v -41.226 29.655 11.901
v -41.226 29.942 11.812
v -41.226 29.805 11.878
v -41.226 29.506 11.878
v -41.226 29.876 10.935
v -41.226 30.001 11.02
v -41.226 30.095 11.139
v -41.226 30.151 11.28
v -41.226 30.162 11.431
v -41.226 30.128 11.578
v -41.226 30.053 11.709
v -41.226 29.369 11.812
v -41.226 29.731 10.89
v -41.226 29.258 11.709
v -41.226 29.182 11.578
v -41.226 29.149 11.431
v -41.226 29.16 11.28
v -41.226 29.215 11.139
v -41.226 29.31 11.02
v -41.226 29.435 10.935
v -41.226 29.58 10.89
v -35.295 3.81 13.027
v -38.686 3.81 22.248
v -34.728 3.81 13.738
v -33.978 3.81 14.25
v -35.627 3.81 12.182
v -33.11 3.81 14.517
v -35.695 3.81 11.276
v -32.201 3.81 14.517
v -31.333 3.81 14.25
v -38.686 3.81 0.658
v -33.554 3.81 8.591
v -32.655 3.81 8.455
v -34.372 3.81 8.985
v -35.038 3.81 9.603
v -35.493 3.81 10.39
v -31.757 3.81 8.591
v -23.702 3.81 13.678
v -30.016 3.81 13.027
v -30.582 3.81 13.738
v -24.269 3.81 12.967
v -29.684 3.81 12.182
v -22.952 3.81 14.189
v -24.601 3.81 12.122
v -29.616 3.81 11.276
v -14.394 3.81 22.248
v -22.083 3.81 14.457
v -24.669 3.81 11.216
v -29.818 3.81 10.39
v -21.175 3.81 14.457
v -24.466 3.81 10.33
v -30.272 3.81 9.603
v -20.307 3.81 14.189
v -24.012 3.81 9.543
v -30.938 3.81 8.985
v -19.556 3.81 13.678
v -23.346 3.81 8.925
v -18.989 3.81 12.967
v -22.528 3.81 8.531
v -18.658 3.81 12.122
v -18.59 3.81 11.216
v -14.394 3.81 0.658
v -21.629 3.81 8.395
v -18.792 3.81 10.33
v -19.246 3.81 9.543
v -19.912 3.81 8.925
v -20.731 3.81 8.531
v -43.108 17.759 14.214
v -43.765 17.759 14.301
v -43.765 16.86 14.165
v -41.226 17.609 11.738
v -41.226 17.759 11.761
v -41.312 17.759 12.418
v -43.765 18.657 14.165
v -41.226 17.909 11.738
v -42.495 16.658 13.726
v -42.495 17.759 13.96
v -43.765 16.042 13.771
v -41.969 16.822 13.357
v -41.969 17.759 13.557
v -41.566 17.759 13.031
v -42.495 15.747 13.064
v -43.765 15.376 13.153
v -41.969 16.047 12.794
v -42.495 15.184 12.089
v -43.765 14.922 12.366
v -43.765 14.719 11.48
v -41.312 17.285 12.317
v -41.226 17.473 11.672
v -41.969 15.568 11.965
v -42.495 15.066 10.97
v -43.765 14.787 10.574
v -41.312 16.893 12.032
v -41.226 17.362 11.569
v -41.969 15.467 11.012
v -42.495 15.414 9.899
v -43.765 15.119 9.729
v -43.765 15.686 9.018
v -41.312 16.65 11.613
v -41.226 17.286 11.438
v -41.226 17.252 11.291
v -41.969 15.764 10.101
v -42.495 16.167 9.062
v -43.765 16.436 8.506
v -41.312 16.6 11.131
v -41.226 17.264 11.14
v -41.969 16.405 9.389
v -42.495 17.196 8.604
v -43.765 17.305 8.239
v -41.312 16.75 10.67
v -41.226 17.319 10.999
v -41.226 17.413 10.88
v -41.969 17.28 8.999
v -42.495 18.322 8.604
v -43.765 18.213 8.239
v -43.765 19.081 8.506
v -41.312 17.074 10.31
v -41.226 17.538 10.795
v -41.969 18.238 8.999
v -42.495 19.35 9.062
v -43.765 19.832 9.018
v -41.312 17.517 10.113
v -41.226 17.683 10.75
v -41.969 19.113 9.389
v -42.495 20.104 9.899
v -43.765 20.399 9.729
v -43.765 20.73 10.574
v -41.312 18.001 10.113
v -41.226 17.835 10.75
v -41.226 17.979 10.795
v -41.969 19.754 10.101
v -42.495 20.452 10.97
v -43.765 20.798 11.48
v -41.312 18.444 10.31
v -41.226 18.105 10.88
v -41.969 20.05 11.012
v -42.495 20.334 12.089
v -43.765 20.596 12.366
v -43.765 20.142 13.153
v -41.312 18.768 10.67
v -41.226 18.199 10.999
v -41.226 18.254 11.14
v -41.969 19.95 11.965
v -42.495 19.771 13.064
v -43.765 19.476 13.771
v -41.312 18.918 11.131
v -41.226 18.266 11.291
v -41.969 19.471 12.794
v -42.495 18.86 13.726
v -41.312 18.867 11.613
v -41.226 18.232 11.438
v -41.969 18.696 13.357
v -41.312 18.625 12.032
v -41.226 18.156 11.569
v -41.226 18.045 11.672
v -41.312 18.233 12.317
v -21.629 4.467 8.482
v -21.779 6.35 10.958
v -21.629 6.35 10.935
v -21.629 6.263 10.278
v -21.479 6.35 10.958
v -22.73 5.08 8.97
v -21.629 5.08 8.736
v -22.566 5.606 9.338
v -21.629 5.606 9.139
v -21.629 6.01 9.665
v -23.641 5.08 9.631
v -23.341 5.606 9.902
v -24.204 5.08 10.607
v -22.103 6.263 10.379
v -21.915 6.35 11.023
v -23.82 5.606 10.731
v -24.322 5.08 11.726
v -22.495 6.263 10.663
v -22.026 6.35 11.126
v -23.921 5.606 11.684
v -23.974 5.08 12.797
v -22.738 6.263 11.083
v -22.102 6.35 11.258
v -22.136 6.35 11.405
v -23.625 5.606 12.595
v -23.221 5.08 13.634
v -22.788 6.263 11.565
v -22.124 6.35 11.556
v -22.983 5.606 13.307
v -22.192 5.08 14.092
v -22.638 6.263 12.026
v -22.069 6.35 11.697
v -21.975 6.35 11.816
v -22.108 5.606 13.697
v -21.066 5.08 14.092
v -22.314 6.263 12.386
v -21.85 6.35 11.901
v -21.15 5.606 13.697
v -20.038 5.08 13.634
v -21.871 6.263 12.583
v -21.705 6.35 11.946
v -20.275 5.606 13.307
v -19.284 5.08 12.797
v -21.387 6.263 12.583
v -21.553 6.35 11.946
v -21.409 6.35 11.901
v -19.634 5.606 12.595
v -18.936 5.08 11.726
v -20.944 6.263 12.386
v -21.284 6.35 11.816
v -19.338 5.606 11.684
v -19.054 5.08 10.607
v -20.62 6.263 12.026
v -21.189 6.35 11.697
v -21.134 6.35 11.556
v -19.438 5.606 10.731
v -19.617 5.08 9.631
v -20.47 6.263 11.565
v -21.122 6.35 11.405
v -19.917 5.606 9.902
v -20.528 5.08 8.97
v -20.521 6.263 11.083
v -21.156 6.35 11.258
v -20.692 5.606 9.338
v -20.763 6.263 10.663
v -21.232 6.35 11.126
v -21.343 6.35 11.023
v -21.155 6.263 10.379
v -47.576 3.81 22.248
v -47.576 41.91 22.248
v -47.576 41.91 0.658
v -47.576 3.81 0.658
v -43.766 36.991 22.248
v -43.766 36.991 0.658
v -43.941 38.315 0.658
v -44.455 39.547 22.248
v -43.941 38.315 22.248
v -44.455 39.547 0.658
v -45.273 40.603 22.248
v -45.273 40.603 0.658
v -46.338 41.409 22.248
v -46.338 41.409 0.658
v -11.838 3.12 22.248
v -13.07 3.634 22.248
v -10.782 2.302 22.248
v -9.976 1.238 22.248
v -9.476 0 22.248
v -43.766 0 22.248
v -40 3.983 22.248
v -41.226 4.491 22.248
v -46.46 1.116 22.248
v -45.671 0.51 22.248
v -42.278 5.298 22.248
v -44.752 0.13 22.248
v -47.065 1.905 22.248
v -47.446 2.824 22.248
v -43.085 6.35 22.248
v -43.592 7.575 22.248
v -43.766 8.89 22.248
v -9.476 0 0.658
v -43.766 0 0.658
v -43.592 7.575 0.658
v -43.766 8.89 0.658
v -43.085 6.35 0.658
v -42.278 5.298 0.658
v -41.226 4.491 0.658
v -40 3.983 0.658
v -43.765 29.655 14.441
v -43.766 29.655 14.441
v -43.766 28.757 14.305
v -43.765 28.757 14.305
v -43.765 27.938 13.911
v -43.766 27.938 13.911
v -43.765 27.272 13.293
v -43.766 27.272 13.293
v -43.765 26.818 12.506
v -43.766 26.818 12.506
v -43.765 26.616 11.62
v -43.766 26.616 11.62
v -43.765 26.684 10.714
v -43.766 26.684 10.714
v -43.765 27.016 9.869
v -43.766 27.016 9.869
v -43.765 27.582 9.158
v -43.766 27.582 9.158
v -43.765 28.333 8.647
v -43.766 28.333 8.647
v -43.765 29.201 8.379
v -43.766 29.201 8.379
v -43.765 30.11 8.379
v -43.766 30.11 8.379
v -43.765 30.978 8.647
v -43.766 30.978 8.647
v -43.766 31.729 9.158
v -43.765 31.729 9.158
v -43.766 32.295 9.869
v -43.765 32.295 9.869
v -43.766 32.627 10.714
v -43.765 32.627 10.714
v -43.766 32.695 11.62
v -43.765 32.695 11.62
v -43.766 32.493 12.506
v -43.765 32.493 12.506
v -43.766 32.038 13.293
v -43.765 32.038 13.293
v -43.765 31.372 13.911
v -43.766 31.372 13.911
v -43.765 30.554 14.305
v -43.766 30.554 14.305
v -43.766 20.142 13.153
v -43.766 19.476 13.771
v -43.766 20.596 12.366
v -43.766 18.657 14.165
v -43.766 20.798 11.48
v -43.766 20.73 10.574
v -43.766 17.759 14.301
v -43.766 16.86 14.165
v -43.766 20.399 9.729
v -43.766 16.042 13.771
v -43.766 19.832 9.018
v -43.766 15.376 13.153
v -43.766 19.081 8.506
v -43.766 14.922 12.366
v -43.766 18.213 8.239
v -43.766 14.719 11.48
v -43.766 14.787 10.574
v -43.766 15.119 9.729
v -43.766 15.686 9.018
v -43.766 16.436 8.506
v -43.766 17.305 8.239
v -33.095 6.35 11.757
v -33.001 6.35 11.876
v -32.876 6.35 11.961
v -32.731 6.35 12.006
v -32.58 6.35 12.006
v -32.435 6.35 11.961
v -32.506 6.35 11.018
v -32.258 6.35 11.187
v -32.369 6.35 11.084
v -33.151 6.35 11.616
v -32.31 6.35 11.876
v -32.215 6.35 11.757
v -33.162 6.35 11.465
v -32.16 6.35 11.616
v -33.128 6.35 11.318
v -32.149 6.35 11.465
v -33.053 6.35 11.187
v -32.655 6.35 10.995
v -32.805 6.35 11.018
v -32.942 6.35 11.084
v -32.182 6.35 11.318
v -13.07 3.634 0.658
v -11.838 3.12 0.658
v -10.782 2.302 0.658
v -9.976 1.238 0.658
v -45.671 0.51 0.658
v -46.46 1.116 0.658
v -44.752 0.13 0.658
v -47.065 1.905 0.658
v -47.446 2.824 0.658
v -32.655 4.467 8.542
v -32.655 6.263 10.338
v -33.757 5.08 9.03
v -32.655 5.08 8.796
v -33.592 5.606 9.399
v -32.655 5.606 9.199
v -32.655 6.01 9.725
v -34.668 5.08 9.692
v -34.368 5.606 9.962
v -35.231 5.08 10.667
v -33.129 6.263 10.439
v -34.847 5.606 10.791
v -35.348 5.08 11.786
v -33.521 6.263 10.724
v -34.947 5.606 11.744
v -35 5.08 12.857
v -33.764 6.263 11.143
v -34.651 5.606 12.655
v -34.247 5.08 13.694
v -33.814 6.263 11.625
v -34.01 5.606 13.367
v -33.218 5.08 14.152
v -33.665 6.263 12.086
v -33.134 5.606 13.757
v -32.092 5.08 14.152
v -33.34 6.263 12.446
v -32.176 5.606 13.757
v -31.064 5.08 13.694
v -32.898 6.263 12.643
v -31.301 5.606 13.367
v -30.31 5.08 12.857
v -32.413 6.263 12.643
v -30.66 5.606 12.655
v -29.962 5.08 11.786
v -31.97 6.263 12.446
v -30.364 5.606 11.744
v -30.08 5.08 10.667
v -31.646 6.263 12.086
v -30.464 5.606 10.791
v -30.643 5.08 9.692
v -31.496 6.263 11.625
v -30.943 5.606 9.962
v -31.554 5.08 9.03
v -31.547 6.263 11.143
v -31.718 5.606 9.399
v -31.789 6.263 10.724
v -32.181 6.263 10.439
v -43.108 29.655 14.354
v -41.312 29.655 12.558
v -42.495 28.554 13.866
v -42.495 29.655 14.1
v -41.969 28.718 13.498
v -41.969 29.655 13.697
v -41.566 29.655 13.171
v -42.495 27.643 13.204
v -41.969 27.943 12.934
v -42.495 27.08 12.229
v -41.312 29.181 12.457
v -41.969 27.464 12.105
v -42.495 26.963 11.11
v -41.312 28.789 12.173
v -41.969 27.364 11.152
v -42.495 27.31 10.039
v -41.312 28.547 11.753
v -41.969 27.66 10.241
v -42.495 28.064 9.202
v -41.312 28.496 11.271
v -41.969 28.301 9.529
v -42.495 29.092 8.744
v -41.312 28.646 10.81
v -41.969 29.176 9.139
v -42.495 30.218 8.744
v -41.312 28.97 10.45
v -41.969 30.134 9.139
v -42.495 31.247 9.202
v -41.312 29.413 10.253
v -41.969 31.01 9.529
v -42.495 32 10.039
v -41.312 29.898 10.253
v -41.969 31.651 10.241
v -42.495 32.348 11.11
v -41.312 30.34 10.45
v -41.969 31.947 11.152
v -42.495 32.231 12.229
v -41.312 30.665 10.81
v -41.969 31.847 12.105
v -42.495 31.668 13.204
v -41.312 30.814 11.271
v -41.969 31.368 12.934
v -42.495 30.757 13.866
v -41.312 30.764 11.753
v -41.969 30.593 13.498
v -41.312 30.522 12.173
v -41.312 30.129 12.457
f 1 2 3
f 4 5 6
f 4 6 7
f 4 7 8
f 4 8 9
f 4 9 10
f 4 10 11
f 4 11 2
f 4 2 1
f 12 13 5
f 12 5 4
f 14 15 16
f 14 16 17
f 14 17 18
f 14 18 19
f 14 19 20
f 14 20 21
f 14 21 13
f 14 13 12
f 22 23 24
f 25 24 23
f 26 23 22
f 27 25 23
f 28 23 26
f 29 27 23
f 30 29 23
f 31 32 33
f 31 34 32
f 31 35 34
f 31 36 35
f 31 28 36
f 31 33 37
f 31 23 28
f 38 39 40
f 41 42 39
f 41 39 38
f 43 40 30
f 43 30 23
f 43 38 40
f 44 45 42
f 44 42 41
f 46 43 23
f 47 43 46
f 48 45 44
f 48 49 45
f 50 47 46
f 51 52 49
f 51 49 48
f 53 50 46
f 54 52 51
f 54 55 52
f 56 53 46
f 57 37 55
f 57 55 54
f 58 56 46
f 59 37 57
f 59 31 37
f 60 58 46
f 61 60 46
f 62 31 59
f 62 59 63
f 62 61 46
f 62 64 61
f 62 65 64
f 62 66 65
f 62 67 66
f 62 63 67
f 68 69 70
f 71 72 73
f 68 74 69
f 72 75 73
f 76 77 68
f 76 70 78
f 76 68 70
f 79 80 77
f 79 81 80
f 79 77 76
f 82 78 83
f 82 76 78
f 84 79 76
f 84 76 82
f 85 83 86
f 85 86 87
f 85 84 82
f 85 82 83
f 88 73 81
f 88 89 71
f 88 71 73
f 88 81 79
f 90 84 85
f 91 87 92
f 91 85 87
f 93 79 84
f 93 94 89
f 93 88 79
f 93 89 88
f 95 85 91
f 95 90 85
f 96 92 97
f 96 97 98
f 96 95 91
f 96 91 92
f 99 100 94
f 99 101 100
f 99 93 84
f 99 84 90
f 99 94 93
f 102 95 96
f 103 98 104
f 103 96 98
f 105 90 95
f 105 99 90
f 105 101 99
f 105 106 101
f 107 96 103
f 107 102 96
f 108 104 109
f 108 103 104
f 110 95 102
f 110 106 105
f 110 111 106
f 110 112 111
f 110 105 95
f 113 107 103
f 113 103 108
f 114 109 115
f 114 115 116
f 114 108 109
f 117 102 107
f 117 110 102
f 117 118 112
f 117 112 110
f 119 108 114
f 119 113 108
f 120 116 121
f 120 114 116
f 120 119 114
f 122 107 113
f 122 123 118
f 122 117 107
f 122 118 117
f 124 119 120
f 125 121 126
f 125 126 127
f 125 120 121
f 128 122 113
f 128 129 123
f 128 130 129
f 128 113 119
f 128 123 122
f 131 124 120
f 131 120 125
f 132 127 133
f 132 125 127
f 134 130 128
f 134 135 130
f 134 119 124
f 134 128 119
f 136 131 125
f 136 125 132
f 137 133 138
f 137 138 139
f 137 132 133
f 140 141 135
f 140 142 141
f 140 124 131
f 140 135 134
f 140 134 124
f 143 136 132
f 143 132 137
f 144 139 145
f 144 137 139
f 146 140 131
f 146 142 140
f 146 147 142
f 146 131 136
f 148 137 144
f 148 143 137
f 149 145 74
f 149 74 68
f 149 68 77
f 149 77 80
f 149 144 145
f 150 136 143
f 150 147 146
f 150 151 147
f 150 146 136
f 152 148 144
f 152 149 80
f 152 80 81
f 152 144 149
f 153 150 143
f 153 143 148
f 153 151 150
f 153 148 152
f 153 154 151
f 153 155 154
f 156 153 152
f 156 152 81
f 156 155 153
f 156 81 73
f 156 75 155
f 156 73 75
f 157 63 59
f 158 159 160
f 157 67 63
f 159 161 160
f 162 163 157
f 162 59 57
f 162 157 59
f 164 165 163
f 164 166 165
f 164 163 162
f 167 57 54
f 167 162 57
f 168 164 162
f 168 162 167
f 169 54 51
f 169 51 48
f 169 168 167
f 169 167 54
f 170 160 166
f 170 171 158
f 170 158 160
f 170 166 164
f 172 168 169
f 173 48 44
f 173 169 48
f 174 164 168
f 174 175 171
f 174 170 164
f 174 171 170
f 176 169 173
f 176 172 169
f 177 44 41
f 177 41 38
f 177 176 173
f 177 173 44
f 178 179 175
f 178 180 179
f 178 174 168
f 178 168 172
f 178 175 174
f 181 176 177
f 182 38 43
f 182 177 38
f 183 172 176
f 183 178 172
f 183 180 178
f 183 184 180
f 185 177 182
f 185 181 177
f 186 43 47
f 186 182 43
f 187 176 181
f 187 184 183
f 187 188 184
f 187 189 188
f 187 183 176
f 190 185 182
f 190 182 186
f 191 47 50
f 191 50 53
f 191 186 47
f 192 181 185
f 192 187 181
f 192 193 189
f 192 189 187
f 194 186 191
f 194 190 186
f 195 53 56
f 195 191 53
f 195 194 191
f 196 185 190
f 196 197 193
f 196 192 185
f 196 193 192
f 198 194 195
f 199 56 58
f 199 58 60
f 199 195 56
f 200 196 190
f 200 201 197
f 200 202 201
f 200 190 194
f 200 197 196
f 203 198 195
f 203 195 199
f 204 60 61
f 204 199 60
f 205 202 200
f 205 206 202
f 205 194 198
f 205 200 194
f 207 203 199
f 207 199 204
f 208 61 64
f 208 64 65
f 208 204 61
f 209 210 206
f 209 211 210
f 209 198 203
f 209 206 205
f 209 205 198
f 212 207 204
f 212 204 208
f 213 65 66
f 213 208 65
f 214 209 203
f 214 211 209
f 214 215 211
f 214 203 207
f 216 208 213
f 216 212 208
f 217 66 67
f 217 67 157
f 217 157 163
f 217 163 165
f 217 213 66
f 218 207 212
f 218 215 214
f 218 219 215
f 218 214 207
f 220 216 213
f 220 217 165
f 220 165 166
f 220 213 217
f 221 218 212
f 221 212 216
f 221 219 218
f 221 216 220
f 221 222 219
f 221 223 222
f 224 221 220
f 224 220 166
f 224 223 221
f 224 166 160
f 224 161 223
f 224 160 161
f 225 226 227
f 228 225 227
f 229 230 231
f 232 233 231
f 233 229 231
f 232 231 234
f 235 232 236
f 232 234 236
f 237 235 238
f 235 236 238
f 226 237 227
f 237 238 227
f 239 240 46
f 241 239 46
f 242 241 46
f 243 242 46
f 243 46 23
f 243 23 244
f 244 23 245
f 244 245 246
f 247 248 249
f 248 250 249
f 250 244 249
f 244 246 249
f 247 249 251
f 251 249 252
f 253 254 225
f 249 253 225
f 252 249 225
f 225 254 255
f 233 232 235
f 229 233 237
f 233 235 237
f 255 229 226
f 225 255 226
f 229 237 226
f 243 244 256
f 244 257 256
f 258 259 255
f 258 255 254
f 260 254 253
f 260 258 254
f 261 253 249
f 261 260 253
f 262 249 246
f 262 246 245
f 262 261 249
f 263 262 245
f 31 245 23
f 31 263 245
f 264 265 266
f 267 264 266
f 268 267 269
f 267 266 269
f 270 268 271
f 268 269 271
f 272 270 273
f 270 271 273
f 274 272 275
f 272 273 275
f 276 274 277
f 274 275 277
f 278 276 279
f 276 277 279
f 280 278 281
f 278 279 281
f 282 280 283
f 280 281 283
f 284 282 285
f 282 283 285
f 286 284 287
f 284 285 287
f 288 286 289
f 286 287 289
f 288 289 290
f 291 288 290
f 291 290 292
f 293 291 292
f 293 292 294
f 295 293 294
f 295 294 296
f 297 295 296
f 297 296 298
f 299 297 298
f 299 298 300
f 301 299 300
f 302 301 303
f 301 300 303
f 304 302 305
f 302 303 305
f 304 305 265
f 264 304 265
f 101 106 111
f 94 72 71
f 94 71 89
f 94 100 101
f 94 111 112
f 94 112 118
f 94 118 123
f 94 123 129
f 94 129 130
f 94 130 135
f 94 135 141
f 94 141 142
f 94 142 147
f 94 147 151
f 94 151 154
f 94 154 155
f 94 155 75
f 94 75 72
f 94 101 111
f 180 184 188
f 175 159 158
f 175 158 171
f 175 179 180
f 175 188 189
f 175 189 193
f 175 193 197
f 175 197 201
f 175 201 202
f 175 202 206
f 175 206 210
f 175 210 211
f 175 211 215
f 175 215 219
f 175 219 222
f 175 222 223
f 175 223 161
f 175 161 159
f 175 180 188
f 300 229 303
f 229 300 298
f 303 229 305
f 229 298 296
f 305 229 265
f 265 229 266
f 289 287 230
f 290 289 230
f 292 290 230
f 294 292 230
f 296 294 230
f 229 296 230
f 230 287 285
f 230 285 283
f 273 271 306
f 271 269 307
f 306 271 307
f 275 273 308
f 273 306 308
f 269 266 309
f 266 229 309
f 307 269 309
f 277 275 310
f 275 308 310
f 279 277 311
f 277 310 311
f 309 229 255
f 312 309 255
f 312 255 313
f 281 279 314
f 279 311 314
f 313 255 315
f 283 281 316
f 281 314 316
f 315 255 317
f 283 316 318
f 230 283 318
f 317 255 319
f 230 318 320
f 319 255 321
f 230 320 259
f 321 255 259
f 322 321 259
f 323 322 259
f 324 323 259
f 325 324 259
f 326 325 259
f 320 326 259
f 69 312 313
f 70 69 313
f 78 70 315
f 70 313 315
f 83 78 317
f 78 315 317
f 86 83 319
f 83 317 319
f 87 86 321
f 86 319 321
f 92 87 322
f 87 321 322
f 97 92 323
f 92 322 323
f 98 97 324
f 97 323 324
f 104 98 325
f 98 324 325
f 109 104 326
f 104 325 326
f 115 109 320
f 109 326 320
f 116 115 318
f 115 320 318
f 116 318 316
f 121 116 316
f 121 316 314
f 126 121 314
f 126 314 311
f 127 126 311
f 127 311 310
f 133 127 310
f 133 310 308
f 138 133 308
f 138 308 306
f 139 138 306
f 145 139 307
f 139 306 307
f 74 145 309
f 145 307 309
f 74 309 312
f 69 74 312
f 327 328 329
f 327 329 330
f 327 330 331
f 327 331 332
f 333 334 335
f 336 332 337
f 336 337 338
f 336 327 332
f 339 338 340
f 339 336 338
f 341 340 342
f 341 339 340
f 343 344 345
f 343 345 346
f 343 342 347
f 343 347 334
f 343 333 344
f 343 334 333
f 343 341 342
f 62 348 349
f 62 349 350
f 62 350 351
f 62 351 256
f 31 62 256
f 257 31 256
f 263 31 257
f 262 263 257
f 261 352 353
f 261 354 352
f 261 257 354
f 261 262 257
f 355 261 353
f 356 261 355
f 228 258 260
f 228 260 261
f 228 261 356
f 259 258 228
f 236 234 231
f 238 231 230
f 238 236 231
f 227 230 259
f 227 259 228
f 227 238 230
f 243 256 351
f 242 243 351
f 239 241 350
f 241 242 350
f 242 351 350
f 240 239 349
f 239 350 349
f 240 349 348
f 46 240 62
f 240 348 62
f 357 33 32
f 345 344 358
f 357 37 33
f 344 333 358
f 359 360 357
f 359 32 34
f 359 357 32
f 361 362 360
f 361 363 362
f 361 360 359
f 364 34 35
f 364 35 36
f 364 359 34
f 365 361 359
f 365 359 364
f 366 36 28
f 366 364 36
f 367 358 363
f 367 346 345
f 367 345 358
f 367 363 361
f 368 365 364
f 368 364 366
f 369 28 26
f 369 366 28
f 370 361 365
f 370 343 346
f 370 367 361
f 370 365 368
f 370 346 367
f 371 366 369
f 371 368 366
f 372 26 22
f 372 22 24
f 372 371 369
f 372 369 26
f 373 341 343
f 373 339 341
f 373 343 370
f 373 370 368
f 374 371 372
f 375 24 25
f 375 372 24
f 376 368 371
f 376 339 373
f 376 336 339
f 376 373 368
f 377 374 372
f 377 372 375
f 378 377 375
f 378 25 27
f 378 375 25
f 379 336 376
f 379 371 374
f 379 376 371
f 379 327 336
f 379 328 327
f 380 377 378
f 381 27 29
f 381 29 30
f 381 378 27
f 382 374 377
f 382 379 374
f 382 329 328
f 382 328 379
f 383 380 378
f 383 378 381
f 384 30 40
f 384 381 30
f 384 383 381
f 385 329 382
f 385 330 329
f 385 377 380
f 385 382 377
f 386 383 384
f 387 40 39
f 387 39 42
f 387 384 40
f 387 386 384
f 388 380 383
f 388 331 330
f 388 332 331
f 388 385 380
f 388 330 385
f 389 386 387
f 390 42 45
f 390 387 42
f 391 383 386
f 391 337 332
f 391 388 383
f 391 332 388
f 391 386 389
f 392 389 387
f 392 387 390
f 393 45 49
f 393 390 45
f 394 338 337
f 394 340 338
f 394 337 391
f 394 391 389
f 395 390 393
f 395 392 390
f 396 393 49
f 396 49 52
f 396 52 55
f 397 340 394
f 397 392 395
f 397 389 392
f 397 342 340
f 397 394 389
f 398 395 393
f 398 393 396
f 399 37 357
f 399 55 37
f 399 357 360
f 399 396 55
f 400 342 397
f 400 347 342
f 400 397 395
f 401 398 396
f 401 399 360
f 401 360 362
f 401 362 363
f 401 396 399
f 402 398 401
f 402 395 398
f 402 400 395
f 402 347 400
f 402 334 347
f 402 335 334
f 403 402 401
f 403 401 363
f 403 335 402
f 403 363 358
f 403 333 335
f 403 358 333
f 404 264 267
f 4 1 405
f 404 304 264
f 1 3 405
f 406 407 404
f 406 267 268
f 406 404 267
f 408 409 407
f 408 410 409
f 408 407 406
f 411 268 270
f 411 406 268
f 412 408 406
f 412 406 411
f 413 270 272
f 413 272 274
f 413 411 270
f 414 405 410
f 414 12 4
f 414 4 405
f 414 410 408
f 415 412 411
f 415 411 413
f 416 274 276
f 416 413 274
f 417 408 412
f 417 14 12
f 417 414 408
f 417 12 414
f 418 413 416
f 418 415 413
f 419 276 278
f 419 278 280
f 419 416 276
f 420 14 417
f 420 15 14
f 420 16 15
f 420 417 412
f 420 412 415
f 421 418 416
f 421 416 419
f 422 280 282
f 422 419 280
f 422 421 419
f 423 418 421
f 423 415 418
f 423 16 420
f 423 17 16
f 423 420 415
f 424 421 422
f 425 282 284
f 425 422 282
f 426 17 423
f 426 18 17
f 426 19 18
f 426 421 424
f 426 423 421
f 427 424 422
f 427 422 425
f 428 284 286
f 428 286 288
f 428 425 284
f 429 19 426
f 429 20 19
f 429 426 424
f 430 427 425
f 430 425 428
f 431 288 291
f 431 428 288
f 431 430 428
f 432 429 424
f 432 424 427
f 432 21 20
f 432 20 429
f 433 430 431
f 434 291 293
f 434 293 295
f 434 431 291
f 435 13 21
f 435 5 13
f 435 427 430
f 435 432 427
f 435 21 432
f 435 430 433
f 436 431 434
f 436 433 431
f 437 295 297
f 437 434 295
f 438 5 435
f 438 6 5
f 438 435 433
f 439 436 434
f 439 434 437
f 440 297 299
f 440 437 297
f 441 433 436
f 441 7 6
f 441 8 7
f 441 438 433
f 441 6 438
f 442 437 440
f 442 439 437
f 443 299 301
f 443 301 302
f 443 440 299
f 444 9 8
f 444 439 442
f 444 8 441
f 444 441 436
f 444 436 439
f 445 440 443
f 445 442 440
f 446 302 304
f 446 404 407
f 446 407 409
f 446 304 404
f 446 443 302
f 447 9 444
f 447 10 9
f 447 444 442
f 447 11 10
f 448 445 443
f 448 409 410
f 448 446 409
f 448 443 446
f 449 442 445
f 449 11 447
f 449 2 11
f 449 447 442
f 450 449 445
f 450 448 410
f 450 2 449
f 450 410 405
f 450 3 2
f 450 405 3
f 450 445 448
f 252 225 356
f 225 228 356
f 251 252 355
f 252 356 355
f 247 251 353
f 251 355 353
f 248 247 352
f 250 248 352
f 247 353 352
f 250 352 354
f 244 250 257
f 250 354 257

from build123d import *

# Parameters (mm, degrees)
SKETCH1_W           = 38.1
SKETCH1_H           = 21.59
BOSS_EXTRUDE1_DEPTH = 3.81
SKETCH2_W           = 3.81
SKETCH2_H           = 21.59
BOSS_EXTRUDE2_DEPTH = 38.1
FILLET1_R           = 5.08
FILLET2_R           = 3.81
SKETCH4_R           = 3.048
BOSS_EXTRUDE3_DEPTH = 2.54
SKETCH5_R           = 3.048
BOSS_EXTRUDE4_DEPTH = 2.54
FILLET3_R           = 2.54


# Some blends are built 0.0001 mm under size
with BuildPart() as part:
    # Sketch1 → Boss-Extrude1 (new body)
    with BuildSketch(Plane(origin=(0, 0, 0), x_dir=(1, 0, 0), z_dir=(0, 1, 0))):
        with Locations((-28.525509612, -11.453306042)):
            Rectangle(SKETCH1_W, SKETCH1_H)
    extrude(amount=BOSS_EXTRUDE1_DEPTH)

    # Sketch2 → Boss-Extrude2 (add)
    with BuildSketch(Plane(origin=(0, 3.81, 0), x_dir=(1, 0, 0), z_dir=(0, 1, 0))):
        with Locations((-45.670509612, -11.453306042)):
            Rectangle(SKETCH2_W, SKETCH2_H)
    extrude(amount=BOSS_EXTRUDE2_DEPTH)

    # Fillet1
    # the kernel refuses this fillet: 5.08 mm, written as the material it adds along each edge
    with BuildSketch(Plane(origin=(-43.765509612, 3.81, 0.658306042), x_dir=(1, 0, 0), z_dir=(0, 0, 1))) as fillet1_piece_1:
        with BuildLine():
            CenterArc((FILLET1_R, FILLET1_R), FILLET1_R, 180, 90)
            Line((0, FILLET1_R), (0, 0))
            Line((0, 0), (FILLET1_R, 0))
        make_face()
    extrude(amount=21.59)
    # the kernel refuses this fillet: 5.08 mm, written as the material it takes off along each edge
    with BuildSketch(Plane(origin=(-9.475509612, 3.81, -11.638416082), x_dir=(-1, 0, 0), z_dir=(0, 0, 1))) as fillet1_2_piece_1:
        with BuildLine():
            CenterArc((4.91868885, 5.08), FILLET1_R, 194.477512186, 75.522487814)
            Line((0, 3.81), (0, 0))
            Line((0, 0), (4.91868885, 0))
        make_face()
    extrude(amount=46.183444248, mode=Mode.SUBTRACT)
    with BuildSketch(Plane(origin=(-43.765509612, 41.91, -11.638416082), x_dir=(-1, 0, 0), z_dir=(0, 0, 1))) as fillet1_2_piece_2:
        with BuildLine():
            CenterArc((5.08, 4.91868885), FILLET1_R, 180, 75.522487814)
            Line((0, 4.91868885), (0, 0))
            Line((0, 0), (3.81, 0))
        make_face()
    extrude(amount=46.183444248, mode=Mode.SUBTRACT)

    # Fillet2
    fillet2_edges = [part.edges().sort_by_distance(p)[0] for p in [
        (-47.575509612, 0, 11.453306042),
    ]]
    fillet(fillet2_edges, radius=FILLET2_R)

    # Sketch4 → Boss-Extrude3 (add)
    with BuildSketch(Plane(origin=(-43.765509612, 0, 0), x_dir=(0, 0, -1), z_dir=(1, 0, 0))):
        with Locations(Location((-11.392673718, 29.655405516, 0), (0, 0, 180))):
            Circle(SKETCH4_R)
        with Locations(Location((-11.252567749, 17.758913463, 0), (0, 0, 180))):
            Circle(SKETCH4_R)
    extrude(amount=BOSS_EXTRUDE3_DEPTH)

    # Sketch5 → Boss-Extrude4 (add)
    with BuildSketch(Plane(origin=(0, 3.81, 0), x_dir=(1, 0, 0), z_dir=(0, 1, 0))):
        with Locations(Location((-32.655326175, -11.503425175, 0), (0, 0, 90))):
            Circle(SKETCH5_R)
        with Locations(Location((-21.629116904, -11.443282215, 0), (0, 0, 90))):
            Circle(SKETCH5_R)
    extrude(amount=BOSS_EXTRUDE4_DEPTH)

    # Fillet3
    fillet3_edges = [part.edges().sort_by_distance(p)[0] for p in [
        (-41.225509612, 29.655405516, 8.344673718),
        (-41.225509612, 17.758913463, 8.204567749),
        (-32.655326175, 6.35, 14.551425175),
        (-21.629116904, 6.35, 14.491282215),
    ]]
    fillet(fillet3_edges, radius=FILLET3_R - 0.0001)  # a hair under: the kernel refuses the full size


solid = part.part
